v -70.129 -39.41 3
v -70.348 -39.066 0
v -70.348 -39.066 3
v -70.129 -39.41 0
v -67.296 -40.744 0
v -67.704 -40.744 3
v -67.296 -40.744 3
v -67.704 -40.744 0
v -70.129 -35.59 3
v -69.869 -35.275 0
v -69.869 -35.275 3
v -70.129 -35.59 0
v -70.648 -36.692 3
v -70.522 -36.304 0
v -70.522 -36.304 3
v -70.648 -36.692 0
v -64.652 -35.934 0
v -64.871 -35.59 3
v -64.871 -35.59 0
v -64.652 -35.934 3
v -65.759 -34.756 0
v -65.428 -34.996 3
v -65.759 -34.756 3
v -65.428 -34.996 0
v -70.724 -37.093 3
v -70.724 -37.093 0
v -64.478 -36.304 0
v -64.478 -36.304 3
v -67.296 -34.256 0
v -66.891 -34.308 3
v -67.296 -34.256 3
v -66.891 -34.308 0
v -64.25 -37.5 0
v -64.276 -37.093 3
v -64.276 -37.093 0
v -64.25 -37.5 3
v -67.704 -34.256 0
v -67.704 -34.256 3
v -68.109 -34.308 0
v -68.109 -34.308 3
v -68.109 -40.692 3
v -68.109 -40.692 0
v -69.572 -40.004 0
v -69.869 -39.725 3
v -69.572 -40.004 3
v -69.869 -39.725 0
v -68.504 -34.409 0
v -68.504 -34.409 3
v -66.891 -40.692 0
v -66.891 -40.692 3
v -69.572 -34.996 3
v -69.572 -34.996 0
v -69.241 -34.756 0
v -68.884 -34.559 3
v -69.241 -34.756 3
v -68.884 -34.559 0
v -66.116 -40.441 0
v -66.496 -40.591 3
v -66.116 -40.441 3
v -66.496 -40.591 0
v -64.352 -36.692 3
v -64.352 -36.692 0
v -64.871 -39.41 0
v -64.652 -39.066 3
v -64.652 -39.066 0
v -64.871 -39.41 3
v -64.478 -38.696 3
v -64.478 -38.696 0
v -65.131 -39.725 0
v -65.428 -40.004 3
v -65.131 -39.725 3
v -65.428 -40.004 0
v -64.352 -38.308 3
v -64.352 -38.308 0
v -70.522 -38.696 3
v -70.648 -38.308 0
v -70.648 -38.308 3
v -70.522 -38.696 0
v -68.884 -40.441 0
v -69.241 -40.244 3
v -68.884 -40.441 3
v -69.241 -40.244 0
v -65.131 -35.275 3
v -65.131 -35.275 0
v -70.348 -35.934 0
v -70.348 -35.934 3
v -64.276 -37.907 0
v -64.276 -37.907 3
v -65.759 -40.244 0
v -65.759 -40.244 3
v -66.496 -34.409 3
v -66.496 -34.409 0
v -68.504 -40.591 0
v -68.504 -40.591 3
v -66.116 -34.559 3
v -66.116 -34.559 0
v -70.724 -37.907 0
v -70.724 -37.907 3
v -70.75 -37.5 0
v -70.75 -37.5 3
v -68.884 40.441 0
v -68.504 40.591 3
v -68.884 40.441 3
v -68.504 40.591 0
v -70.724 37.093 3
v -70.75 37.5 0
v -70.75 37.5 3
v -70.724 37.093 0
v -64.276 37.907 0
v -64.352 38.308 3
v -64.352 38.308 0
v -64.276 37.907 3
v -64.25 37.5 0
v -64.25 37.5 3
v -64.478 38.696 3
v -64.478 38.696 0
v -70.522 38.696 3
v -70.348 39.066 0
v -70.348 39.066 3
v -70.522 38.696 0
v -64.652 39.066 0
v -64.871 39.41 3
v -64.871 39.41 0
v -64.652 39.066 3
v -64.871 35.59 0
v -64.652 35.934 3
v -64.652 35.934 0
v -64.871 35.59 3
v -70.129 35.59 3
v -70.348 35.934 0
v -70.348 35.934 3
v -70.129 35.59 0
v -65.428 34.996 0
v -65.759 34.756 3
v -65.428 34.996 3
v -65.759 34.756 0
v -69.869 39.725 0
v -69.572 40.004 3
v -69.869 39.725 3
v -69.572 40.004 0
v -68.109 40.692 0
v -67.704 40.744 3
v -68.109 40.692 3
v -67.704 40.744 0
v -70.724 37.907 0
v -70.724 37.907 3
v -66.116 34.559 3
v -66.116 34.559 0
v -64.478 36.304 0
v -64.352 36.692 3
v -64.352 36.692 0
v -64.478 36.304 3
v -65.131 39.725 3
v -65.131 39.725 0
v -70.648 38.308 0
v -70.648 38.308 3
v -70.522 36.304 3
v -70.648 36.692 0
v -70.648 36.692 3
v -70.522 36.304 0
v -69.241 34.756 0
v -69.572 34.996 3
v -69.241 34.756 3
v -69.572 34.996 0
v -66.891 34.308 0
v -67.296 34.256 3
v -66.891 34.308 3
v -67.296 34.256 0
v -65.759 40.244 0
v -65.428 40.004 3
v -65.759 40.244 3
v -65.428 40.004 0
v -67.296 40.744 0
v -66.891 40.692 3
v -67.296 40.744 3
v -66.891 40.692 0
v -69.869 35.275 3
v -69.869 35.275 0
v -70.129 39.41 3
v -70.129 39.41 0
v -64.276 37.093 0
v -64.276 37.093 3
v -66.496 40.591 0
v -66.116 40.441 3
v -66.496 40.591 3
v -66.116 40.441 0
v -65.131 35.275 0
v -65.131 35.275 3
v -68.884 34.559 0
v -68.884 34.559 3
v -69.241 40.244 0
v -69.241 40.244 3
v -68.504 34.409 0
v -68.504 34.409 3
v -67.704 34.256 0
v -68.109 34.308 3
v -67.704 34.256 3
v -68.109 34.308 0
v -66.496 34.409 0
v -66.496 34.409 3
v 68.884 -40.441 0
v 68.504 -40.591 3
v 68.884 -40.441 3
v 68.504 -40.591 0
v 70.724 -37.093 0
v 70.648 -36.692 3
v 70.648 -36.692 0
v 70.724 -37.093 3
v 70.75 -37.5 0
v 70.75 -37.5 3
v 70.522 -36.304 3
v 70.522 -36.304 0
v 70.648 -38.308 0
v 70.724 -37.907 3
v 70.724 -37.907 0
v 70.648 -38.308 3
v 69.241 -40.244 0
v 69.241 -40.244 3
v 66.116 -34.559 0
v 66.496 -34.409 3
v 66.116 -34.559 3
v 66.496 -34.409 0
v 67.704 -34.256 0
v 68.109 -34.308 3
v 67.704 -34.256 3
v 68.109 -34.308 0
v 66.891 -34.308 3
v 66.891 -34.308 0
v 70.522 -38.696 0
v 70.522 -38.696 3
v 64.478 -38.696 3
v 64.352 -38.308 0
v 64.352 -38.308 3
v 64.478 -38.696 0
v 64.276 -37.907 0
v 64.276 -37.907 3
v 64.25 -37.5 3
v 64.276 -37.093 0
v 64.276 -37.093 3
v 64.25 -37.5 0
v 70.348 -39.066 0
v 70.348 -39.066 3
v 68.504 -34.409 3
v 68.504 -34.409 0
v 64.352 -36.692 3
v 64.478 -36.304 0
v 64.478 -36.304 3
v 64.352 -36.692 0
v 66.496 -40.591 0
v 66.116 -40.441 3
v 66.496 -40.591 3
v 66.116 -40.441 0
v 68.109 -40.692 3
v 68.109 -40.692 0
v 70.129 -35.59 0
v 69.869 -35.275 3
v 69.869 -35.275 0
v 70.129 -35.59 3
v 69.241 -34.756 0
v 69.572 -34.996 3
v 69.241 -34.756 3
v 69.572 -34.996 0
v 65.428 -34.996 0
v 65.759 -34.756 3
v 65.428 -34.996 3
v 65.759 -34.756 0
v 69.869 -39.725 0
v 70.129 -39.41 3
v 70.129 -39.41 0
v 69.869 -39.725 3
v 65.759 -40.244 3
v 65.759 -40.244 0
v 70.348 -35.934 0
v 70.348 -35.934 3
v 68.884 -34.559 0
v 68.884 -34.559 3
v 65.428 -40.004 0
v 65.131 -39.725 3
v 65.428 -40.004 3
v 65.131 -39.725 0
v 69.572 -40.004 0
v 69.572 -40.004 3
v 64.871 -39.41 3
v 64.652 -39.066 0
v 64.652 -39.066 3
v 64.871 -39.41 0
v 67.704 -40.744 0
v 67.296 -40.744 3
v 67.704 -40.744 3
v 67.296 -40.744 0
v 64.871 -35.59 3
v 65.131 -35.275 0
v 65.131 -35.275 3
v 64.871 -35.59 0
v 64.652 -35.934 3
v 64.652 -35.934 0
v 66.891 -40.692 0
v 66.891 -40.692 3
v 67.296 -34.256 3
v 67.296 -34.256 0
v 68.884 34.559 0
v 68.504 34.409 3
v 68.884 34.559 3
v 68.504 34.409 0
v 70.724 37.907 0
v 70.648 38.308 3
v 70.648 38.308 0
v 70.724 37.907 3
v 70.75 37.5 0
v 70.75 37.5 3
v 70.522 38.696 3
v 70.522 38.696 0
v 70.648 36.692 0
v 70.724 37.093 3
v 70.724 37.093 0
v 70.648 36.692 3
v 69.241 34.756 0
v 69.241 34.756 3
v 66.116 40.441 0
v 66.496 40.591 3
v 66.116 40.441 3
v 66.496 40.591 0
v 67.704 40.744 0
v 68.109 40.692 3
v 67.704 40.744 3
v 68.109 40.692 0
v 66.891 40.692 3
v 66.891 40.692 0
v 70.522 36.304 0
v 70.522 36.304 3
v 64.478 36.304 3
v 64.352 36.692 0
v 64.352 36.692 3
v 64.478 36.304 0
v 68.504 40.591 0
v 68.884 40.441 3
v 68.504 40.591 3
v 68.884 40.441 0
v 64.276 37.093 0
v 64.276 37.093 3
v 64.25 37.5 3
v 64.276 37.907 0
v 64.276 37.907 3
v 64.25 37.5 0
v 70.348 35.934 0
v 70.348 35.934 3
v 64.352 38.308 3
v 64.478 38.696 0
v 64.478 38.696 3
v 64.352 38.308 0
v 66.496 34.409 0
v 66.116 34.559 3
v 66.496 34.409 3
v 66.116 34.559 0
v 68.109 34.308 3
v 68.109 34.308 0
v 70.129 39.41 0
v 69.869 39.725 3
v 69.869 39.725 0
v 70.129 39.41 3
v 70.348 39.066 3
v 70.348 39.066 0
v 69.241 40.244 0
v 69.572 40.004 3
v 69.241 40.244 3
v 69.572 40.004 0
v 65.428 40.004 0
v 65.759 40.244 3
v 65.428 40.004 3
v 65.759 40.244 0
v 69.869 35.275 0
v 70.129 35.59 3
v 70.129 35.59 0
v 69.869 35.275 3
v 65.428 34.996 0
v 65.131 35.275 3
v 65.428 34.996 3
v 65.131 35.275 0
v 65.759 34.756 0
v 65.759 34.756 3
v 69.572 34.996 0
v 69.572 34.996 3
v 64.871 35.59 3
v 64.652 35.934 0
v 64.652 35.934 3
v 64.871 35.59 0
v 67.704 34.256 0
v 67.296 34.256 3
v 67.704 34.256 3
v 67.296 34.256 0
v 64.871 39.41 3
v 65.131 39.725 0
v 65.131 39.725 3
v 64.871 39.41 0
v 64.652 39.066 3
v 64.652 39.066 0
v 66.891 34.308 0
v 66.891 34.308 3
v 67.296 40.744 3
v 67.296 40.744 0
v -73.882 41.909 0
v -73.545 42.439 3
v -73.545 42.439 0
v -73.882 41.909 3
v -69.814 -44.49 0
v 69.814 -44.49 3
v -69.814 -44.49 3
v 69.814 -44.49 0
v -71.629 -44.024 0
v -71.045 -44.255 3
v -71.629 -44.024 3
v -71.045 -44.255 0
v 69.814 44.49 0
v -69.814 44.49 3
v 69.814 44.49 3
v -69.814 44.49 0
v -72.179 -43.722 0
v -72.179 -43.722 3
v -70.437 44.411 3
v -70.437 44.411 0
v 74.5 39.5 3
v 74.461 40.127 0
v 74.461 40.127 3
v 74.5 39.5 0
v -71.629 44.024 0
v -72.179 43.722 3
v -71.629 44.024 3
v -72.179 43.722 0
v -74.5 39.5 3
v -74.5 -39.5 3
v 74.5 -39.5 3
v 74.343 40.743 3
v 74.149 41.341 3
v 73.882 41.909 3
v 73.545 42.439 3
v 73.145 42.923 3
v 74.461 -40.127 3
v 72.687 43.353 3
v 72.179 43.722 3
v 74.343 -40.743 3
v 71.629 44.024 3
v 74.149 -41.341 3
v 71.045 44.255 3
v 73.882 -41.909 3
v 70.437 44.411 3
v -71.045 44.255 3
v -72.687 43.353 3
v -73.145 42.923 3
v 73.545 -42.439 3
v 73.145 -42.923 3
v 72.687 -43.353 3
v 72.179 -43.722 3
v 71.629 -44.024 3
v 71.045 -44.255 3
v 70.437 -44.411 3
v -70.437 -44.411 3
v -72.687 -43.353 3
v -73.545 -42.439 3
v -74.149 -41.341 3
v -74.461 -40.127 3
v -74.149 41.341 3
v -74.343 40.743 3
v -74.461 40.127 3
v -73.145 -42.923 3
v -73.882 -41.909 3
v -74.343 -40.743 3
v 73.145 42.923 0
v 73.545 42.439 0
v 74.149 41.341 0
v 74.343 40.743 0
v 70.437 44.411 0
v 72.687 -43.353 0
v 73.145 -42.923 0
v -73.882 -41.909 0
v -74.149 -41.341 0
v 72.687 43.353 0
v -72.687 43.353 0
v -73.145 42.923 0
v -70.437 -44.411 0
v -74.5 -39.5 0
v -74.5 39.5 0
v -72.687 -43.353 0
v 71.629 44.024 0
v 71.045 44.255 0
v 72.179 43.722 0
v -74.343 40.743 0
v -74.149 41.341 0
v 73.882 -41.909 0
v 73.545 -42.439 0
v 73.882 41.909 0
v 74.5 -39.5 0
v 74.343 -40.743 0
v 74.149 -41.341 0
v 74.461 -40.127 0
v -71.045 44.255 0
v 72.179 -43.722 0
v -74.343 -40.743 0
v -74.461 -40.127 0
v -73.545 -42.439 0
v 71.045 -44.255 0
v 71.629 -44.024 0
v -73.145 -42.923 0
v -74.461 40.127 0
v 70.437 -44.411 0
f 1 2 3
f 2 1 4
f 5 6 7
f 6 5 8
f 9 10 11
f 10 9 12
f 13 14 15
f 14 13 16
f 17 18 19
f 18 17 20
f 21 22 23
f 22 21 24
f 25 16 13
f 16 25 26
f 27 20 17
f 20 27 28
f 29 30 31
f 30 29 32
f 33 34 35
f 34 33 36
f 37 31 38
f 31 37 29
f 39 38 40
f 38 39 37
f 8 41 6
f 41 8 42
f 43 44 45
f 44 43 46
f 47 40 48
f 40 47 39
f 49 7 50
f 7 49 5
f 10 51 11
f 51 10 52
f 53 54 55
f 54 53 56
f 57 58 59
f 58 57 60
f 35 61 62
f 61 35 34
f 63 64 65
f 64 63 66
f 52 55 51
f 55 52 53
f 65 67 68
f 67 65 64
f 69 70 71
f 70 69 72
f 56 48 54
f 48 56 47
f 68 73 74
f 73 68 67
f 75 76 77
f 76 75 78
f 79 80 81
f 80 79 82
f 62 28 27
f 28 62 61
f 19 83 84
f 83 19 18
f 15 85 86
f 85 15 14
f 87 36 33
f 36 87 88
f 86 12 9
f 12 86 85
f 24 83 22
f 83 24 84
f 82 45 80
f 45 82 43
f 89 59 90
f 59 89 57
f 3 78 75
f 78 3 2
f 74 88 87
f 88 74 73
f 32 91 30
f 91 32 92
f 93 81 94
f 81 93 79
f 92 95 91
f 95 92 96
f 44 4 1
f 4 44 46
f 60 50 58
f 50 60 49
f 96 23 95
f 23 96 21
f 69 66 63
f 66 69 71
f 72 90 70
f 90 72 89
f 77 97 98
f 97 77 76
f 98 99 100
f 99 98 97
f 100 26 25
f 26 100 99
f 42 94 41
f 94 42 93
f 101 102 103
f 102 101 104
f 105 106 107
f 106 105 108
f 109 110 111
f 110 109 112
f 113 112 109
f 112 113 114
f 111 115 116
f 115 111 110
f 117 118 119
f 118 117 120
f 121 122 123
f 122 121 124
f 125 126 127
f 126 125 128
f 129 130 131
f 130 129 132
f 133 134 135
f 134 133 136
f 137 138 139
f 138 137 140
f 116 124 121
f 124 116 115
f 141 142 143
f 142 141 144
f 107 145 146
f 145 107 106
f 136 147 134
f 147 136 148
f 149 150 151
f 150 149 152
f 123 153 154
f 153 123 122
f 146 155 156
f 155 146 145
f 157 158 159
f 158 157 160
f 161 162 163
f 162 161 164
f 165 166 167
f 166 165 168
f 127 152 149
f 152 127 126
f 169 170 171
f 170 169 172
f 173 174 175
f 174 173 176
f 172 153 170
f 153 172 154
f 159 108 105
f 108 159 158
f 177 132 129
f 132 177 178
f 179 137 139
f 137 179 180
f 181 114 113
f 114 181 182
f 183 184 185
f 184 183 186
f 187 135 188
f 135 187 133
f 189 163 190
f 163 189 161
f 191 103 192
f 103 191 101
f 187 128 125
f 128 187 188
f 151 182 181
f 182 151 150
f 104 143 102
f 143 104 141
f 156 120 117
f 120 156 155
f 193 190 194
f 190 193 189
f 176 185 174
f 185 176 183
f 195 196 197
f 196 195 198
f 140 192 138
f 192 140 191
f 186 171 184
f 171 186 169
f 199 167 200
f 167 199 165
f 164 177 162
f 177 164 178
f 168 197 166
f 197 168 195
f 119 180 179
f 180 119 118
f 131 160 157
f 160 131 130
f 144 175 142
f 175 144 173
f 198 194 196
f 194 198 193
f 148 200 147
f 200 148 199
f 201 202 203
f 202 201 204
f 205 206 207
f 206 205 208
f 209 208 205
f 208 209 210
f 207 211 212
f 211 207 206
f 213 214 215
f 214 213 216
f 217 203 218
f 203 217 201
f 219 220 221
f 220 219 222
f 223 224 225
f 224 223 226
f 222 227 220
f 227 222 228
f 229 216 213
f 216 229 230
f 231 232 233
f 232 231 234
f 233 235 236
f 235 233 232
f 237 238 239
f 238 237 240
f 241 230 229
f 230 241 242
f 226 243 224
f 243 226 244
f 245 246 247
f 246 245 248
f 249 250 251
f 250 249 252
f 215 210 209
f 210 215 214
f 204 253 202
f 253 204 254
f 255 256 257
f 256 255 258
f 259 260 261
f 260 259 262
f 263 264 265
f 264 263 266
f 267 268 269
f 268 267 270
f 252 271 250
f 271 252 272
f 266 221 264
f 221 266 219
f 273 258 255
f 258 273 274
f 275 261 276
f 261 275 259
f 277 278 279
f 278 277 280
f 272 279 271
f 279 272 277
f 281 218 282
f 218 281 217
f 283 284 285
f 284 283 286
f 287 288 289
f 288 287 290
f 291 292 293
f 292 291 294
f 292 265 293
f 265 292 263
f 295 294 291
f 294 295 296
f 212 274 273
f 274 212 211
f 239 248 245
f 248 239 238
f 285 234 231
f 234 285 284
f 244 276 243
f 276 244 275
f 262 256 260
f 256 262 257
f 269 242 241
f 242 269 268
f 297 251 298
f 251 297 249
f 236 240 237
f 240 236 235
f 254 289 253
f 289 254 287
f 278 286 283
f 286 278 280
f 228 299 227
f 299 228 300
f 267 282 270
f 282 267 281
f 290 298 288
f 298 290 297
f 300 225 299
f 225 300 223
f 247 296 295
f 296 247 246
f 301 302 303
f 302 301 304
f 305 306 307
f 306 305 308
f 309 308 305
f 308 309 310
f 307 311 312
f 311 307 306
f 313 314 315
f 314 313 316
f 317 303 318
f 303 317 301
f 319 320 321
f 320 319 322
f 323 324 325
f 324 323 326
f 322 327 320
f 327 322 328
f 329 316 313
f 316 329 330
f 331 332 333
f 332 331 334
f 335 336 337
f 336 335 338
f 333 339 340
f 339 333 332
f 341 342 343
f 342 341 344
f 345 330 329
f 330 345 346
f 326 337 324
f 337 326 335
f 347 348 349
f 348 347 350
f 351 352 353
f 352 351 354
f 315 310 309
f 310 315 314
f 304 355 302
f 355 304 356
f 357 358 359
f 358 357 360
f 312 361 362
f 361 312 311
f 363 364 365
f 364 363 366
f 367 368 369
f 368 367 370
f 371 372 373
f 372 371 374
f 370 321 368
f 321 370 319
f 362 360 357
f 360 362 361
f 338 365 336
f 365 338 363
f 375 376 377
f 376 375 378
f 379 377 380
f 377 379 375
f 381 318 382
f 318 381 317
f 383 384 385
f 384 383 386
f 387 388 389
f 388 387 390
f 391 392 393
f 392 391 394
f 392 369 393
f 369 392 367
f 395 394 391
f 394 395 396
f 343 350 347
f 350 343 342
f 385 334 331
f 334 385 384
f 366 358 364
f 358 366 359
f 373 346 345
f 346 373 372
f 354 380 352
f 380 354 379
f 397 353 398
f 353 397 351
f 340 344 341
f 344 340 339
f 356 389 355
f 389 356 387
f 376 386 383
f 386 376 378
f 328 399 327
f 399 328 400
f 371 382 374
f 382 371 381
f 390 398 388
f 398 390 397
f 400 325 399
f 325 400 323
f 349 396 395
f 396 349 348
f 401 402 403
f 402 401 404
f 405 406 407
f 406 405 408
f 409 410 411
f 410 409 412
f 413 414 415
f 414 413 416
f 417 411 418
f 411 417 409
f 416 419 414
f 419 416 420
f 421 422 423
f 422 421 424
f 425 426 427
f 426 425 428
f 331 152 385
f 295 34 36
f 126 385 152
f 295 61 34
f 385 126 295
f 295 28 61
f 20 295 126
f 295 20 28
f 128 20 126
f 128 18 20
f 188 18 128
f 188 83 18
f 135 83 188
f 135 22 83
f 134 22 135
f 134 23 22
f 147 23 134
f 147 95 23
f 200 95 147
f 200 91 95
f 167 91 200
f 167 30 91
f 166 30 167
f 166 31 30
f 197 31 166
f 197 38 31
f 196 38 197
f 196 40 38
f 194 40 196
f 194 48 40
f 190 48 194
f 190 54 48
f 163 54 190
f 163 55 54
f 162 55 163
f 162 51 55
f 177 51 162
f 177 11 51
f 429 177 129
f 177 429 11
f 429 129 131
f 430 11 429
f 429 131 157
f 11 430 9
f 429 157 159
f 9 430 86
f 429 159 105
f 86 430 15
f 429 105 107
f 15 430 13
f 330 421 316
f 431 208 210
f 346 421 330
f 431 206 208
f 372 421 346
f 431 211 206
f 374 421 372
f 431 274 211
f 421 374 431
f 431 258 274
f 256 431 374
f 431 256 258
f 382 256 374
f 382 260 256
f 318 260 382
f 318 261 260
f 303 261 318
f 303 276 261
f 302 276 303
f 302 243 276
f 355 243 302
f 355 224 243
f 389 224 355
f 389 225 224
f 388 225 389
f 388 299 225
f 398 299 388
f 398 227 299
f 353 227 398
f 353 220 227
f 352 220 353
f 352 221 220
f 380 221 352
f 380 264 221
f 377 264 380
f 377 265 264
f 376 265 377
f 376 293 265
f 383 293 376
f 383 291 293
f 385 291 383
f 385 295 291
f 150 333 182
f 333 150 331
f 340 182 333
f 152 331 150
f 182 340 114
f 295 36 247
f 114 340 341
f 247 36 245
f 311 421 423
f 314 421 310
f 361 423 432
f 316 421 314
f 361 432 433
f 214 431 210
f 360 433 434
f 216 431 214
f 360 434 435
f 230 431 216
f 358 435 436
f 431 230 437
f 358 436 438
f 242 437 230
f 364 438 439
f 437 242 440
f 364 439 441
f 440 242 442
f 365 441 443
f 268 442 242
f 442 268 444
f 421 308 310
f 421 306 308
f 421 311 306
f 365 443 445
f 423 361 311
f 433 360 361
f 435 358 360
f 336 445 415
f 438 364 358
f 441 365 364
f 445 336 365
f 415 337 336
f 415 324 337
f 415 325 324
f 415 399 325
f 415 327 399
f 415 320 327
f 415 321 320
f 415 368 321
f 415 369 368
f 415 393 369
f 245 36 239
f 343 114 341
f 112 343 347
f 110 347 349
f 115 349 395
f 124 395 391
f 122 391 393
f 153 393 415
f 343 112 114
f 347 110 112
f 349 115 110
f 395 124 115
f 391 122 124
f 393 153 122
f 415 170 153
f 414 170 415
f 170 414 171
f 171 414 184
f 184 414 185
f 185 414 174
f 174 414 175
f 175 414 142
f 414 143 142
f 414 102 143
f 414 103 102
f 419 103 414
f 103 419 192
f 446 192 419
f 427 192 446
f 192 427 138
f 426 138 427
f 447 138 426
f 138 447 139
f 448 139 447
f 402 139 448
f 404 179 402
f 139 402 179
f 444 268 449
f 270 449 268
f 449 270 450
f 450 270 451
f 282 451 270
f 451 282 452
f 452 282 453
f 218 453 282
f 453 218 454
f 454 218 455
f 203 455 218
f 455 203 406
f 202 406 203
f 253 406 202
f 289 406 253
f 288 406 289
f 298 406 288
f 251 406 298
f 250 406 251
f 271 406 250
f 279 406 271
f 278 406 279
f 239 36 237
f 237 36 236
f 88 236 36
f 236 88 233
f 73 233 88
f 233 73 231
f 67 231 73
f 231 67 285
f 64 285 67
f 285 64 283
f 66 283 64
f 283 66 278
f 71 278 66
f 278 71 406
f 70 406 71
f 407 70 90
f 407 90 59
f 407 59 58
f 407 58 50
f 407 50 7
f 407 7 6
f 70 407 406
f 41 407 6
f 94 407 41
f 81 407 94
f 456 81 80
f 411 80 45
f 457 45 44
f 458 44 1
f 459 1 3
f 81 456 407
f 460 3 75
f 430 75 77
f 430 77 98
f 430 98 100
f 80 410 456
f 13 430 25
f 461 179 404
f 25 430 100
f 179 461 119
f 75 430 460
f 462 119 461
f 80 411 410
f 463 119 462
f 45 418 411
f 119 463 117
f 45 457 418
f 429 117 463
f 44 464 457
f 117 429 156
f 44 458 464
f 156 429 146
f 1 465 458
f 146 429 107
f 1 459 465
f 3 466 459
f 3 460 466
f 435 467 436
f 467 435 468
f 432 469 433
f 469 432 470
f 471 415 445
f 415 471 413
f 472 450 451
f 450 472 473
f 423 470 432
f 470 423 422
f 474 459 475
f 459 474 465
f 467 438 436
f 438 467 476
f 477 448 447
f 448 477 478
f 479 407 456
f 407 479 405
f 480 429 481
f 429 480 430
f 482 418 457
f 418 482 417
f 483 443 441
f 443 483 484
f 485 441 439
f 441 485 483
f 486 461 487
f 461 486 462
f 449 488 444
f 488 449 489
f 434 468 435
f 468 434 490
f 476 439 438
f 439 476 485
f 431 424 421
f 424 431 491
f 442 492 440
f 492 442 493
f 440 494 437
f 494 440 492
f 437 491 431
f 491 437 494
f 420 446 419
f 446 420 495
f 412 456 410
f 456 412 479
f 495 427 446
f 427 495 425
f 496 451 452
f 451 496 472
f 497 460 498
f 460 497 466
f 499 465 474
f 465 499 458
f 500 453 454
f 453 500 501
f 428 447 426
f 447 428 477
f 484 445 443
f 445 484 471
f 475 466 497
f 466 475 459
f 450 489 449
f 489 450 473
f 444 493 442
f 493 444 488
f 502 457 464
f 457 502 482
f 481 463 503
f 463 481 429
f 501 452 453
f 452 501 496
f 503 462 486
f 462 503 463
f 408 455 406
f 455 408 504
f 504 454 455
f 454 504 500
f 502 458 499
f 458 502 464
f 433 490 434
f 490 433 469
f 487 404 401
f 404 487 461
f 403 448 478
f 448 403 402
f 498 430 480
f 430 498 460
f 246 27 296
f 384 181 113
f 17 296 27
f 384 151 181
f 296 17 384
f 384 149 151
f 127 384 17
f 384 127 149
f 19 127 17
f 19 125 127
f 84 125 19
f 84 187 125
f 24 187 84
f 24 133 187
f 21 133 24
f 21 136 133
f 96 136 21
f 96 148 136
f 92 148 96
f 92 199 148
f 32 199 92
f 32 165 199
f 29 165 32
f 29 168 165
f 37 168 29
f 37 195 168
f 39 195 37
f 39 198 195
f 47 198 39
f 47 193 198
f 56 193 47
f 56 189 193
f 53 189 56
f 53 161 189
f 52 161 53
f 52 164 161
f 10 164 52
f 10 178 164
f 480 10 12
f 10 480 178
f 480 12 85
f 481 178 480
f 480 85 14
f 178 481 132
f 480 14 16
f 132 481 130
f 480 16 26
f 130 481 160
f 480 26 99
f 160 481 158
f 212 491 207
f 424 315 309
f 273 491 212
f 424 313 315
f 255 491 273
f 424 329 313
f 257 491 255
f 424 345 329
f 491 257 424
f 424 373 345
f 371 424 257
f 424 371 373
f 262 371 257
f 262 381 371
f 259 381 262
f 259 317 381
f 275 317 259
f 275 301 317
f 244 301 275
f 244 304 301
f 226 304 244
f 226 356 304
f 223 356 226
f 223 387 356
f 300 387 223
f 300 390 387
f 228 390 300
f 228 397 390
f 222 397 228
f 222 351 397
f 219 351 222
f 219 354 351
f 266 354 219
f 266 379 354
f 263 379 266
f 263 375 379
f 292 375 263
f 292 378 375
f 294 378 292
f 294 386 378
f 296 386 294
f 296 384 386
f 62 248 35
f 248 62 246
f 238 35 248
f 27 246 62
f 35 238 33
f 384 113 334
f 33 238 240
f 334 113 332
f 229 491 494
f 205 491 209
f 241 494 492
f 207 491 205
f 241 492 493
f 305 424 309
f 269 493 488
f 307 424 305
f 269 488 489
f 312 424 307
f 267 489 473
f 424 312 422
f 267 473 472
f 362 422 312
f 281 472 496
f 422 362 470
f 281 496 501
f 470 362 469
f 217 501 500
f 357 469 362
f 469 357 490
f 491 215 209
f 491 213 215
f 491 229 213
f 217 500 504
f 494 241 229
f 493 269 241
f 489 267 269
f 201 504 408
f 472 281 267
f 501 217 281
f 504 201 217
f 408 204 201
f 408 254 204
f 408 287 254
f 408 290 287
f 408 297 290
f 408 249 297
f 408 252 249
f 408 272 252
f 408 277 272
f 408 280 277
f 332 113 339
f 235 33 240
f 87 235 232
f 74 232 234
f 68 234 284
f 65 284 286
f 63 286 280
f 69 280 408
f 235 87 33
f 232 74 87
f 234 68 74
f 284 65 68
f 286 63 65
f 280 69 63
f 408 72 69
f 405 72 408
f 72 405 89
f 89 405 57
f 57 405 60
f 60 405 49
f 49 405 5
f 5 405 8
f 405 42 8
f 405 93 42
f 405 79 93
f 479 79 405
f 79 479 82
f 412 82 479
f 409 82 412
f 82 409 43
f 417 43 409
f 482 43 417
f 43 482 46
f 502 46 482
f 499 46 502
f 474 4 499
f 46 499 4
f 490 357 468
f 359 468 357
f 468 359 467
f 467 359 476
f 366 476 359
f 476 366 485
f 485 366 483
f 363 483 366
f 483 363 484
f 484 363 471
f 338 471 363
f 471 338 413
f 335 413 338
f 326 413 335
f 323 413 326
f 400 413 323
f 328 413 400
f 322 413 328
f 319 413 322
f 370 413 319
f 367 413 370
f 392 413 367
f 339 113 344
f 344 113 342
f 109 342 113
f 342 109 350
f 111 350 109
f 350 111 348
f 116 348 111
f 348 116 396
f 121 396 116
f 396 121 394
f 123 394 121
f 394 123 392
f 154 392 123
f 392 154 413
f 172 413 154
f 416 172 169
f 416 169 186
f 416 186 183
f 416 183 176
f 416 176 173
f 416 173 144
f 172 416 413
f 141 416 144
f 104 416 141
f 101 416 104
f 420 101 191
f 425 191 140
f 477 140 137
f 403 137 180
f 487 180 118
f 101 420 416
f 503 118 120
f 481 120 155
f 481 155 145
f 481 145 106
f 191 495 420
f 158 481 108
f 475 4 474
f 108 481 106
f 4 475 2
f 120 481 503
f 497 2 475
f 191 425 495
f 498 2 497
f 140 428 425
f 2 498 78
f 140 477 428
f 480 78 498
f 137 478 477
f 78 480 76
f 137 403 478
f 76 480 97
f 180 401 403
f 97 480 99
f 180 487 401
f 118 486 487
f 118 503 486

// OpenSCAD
$fn = 50;


difference() {
	union() {
		hull() {
			translate(v = [-69.5000000000, 39.5000000000, 0]) {
				cylinder(h = 3, r = 5);
			}
			translate(v = [69.5000000000, 39.5000000000, 0]) {
				cylinder(h = 3, r = 5);
			}
			translate(v = [-69.5000000000, -39.5000000000, 0]) {
				cylinder(h = 3, r = 5);
			}
			translate(v = [69.5000000000, -39.5000000000, 0]) {
				cylinder(h = 3, r = 5);
			}
		}
	}
	union() {
		translate(v = [-67.5000000000, -37.5000000000, -100.0000000000]) {
			cylinder(h = 200, r = 3.2500000000);
		}
		translate(v = [-67.5000000000, 37.5000000000, -100.0000000000]) {
			cylinder(h = 200, r = 3.2500000000);
		}
		translate(v = [67.5000000000, -37.5000000000, -100.0000000000]) {
			cylinder(h = 200, r = 3.2500000000);
		}
		translate(v = [67.5000000000, 37.5000000000, -100.0000000000]) {
			cylinder(h = 200, r = 3.2500000000);
		}
	}
}
